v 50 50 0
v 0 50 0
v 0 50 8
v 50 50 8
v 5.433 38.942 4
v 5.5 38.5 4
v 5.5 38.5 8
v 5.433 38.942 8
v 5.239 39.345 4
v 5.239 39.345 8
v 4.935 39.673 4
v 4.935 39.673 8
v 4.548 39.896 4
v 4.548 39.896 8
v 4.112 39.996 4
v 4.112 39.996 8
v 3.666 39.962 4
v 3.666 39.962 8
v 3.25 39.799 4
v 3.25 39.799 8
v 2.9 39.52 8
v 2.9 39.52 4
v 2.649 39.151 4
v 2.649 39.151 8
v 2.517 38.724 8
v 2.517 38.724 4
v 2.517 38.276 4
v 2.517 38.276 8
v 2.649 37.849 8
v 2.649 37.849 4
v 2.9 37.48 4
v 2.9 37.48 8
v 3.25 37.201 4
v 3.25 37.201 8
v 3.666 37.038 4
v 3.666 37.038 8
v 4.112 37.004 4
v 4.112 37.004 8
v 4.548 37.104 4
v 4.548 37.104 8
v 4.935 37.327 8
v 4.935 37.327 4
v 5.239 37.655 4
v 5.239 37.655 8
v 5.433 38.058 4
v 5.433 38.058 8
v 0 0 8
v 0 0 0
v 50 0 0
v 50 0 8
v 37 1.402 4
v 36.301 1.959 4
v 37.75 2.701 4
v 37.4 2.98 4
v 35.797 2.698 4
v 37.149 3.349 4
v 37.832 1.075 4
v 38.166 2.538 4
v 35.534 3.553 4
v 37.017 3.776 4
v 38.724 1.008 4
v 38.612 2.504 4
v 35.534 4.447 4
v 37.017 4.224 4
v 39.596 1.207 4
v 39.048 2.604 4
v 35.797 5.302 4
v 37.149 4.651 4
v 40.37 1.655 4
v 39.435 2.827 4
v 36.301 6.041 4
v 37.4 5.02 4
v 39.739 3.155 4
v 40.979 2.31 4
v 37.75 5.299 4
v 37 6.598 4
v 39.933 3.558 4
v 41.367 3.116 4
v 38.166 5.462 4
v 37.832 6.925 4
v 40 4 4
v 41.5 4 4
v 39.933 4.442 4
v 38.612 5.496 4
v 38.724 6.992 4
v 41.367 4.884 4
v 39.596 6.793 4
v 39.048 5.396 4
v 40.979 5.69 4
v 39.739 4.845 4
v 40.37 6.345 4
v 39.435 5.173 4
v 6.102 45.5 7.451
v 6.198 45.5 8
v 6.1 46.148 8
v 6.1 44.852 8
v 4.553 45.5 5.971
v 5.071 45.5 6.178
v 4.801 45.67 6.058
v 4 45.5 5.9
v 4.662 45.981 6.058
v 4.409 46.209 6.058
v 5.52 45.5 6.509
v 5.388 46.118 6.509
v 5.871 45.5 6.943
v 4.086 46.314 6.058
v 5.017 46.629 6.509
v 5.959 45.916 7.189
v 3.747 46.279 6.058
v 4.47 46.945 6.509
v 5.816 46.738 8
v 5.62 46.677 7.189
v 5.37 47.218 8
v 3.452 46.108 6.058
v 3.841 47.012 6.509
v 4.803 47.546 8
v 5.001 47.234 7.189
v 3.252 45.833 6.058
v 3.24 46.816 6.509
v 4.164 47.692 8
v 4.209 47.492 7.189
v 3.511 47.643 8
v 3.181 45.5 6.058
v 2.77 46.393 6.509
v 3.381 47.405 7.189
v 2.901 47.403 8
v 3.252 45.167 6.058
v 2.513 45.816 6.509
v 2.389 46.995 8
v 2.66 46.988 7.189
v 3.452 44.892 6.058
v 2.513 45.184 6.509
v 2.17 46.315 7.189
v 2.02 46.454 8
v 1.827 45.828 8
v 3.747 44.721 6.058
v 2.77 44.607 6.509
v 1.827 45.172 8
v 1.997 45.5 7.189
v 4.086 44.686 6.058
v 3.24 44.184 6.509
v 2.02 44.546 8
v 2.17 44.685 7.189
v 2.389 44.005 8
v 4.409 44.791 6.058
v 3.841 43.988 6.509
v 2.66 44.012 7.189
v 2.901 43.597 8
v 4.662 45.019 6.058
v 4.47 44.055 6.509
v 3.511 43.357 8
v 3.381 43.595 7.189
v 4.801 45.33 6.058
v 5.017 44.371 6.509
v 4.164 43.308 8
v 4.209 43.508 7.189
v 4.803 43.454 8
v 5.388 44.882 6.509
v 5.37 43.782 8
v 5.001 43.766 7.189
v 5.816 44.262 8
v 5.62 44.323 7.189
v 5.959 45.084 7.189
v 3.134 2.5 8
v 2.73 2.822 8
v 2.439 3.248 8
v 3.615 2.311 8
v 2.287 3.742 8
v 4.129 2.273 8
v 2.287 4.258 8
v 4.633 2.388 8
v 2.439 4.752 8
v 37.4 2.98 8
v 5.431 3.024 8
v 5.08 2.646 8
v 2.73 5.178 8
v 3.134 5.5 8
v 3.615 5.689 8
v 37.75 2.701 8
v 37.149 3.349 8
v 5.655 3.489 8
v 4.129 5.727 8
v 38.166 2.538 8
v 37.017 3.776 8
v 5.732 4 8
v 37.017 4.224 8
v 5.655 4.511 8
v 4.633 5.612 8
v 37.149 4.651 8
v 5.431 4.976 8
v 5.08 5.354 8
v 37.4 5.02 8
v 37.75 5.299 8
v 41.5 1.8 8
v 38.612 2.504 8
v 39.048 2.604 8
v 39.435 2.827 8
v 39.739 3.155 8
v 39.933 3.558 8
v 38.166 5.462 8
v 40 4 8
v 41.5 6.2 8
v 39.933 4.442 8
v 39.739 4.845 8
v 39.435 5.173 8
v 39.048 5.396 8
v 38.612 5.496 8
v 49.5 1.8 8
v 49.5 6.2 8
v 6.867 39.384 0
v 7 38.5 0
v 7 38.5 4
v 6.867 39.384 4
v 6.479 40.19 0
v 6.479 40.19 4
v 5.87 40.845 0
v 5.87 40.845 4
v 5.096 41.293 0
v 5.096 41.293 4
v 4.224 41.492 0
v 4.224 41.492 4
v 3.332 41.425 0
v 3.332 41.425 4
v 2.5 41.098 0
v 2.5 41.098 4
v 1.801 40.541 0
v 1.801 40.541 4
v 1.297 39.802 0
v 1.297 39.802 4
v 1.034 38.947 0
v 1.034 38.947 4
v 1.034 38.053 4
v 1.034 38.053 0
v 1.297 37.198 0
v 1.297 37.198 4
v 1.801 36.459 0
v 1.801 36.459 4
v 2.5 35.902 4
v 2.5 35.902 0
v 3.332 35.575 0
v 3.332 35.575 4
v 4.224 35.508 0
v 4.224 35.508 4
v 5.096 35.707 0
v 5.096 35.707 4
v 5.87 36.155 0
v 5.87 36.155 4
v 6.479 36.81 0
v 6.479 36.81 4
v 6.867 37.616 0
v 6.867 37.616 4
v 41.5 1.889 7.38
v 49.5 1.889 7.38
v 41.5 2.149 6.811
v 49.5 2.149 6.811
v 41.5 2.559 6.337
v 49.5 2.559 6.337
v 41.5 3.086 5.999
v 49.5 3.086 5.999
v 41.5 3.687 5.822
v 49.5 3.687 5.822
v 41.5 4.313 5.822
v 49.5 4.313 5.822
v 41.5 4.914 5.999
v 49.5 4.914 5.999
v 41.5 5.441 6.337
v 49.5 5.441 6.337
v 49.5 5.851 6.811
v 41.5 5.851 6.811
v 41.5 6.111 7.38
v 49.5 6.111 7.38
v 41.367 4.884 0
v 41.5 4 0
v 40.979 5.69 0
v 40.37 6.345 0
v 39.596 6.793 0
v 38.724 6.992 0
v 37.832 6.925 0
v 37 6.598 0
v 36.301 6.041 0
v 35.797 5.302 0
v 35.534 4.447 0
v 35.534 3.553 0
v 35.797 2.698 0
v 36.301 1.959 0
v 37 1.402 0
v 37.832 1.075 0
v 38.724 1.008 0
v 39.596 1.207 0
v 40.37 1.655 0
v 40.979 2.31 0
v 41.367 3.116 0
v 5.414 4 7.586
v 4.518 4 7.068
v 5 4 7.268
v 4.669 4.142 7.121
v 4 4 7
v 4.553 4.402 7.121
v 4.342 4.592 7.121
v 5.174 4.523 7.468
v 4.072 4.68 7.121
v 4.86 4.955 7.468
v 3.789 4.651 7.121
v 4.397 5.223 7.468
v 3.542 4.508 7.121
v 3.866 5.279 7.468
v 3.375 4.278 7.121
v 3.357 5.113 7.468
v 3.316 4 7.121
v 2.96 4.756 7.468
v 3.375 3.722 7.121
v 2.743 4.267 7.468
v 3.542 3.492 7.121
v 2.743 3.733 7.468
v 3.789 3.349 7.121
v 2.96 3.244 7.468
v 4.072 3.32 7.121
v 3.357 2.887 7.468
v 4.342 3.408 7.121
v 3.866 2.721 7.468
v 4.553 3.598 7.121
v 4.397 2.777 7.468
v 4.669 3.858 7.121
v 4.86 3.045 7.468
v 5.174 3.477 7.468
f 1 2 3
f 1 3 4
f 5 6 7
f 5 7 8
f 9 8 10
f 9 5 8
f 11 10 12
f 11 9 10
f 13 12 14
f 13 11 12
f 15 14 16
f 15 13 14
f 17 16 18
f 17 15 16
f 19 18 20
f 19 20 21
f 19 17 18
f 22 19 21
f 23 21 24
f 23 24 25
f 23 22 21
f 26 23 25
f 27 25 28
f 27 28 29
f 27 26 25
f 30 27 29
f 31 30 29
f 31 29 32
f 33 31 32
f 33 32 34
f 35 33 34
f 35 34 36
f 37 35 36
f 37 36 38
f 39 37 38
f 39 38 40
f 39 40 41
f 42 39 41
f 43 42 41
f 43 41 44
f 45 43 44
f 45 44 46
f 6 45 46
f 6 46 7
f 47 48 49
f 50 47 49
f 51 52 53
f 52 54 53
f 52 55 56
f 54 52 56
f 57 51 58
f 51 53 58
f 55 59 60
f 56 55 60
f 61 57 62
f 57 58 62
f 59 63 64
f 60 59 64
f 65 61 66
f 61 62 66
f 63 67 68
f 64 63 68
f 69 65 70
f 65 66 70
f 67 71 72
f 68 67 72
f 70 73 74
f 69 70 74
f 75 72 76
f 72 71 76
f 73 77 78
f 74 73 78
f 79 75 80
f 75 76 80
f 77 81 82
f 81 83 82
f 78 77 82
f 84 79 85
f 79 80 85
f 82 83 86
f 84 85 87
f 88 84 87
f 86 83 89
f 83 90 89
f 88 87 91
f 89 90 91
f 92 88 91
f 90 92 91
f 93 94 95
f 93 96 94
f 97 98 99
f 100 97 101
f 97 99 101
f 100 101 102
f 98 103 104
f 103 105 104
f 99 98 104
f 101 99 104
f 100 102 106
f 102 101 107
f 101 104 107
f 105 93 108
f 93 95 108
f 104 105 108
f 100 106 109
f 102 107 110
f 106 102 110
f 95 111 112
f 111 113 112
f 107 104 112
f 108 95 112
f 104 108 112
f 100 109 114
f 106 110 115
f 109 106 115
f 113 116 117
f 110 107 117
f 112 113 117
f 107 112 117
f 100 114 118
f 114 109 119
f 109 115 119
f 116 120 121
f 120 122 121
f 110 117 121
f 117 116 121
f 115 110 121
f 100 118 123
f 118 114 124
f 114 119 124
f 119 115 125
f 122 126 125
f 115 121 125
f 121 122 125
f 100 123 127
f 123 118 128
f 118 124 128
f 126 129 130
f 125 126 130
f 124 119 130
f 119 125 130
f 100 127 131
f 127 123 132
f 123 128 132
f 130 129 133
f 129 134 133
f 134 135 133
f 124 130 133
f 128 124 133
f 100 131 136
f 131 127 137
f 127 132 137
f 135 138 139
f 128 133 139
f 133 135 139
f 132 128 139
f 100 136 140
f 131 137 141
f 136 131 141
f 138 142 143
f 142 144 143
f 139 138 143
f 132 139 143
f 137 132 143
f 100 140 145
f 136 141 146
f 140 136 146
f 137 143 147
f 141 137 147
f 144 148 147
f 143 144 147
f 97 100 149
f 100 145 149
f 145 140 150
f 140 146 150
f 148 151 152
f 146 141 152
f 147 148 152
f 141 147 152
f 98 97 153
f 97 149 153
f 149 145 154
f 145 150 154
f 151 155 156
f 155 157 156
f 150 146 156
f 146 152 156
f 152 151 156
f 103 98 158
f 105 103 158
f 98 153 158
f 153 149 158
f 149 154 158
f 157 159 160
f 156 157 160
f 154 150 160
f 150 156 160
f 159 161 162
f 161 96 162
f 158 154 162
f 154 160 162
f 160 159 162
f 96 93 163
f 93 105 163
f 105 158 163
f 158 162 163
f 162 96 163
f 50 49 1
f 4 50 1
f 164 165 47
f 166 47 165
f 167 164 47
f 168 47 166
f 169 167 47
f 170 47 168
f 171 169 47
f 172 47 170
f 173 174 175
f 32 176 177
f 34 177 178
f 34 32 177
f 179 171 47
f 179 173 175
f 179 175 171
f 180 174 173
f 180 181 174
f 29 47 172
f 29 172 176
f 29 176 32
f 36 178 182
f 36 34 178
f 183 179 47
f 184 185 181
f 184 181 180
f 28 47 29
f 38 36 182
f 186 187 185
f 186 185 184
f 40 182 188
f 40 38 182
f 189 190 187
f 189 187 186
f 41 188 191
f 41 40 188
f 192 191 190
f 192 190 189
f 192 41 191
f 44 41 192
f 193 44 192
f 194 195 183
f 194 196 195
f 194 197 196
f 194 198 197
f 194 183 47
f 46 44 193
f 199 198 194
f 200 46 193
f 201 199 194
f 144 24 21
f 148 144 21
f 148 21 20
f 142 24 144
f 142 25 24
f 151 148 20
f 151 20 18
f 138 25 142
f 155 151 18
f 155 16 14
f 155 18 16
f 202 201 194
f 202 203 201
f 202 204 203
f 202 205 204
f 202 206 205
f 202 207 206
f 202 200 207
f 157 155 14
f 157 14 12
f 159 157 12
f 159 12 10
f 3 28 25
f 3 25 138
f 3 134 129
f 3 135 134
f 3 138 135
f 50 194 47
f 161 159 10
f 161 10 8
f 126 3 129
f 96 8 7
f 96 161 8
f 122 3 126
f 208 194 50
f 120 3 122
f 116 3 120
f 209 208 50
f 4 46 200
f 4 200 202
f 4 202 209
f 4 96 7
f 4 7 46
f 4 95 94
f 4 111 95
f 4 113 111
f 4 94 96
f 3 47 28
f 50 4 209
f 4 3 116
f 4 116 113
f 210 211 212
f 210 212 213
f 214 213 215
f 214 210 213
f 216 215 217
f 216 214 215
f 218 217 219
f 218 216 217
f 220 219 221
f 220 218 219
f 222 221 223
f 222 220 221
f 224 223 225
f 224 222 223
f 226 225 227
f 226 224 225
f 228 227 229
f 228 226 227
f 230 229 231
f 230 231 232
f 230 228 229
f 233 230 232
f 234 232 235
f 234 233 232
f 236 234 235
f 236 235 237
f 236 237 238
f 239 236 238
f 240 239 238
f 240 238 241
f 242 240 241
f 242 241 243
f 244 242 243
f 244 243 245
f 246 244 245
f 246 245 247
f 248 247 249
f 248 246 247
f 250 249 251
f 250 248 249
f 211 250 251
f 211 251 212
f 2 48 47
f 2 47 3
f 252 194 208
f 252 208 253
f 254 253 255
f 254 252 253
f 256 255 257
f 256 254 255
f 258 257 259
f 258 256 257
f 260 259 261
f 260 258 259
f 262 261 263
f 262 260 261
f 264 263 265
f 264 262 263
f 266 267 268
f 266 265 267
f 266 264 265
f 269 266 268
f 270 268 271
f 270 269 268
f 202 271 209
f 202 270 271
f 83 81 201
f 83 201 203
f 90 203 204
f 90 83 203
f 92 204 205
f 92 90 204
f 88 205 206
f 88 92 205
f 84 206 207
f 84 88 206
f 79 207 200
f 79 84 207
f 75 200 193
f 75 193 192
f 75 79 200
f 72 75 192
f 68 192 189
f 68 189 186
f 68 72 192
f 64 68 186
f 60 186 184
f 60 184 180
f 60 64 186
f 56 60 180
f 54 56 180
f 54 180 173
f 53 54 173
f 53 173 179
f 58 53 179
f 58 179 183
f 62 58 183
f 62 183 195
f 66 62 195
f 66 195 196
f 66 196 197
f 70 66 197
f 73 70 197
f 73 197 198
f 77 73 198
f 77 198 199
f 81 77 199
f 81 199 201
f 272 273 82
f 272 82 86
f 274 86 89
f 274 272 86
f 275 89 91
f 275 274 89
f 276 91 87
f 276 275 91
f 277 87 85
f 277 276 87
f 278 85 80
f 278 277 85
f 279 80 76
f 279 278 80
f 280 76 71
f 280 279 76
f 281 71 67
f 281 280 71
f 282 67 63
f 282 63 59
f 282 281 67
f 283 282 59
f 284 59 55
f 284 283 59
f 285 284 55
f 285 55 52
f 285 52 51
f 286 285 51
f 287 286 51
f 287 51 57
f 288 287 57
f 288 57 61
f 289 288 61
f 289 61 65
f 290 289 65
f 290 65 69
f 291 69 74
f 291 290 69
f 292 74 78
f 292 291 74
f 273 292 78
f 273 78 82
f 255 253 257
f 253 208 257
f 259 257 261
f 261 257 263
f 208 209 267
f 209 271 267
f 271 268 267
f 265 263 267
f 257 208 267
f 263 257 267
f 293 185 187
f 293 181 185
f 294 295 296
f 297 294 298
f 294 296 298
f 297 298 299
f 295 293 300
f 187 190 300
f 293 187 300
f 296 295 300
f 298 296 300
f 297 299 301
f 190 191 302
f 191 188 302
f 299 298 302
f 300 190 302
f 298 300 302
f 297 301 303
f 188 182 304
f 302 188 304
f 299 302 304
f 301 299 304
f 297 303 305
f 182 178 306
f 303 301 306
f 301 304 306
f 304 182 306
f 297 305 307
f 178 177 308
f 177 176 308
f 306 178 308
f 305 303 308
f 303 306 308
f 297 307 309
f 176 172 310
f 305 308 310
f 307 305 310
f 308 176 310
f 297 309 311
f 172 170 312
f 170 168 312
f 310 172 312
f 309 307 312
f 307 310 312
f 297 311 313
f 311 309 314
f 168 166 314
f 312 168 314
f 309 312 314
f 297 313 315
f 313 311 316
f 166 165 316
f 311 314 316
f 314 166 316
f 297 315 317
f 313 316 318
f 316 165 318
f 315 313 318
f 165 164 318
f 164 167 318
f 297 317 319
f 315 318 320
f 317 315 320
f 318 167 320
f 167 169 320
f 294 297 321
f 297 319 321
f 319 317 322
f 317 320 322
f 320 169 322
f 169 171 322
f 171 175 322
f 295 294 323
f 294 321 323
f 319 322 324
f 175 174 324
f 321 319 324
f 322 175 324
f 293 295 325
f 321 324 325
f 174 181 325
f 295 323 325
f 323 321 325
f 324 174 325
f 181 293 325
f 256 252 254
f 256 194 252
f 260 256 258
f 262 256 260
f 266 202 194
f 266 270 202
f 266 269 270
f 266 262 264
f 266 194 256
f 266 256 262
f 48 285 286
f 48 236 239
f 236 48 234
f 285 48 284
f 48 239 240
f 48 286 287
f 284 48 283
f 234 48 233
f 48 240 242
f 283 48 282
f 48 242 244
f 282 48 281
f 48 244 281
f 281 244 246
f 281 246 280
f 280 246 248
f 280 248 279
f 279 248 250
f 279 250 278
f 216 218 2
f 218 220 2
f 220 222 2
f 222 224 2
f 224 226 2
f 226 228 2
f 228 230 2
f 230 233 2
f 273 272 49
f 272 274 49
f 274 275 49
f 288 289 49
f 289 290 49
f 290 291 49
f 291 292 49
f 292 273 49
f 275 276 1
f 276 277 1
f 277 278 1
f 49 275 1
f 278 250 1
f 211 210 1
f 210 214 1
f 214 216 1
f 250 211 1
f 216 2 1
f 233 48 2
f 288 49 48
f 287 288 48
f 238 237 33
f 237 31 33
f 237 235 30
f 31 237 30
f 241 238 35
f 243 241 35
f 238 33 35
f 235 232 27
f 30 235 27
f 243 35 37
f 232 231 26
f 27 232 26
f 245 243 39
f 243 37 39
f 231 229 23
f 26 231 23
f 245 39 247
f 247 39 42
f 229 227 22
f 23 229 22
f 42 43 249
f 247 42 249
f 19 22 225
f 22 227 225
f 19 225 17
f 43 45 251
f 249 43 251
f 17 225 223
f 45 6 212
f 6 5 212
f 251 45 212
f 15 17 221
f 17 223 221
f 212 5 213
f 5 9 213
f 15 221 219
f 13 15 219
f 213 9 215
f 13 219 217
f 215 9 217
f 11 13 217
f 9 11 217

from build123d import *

# Parameters (mm, degrees)
CYLINDER012_R     = 2.2
CYLINDER012_DEPTH = 8
CYLINDER011_R     = 3
CYLINDER011_DEPTH = 4
CYLINDER010_R     = 1.5
CYLINDER010_DEPTH = 8
CYLINDER009_R     = 3
CYLINDER009_DEPTH = 4
CYLINDER008_R     = 1.5
CYLINDER008_DEPTH = 8
BOX002_W          = 50
BOX002_H          = 50
BOX002_DEPTH      = 8


with BuildPart() as cylinder012:
    # Cylinder012 → Cylinder012 (new body)
    with BuildSketch(Plane(origin=(41.5, 4, 8), x_dir=(0, 0, -1), z_dir=(1, 0, 0))):
        Circle(CYLINDER012_R)
    extrude(amount=CYLINDER012_DEPTH)


with BuildPart() as sphere003:
    # Sphere003 → Sphere003 (revolve)
    with BuildSketch(Plane(origin=(4, 45.5, 8.1), x_dir=(1, 0, 0), z_dir=(0, -1, 0))):
        with BuildLine():
            ThreePointArc((0, -2.2), (2.2, 0), (0, 2.2))
            Line((0, 2.2), (0, -2.2))
        make_face()
    revolve(axis=Axis((4, 45.5, 8.1), (0, 0, 1)))


with BuildPart() as sphere001:
    # Sphere001 → Sphere001 (revolve)
    with BuildSketch(Plane(origin=(4, 4, 9), x_dir=(1, 0, 0), z_dir=(0, -1, 0))):
        with BuildLine():
            ThreePointArc((0, -2), (2, 0), (0, 2))
            Line((0, 2), (0, -2))
        make_face()
    revolve(axis=Axis((4, 4, 9), (0, 0, 1)))


with BuildPart() as cylinder011:
    # Cylinder011 → Cylinder011 (new body)
    with BuildSketch(Plane.XY):
        Circle(CYLINDER011_R)
    extrude(amount=CYLINDER011_DEPTH)


with BuildPart() as springhole004:
    # Cylinder010 → Cylinder010 (new body)
    with BuildSketch(Plane.XY):
        Circle(CYLINDER010_R)
    extrude(amount=CYLINDER010_DEPTH)

    # Fusion005: union Cylinder011
    add(cylinder011.part)


with BuildPart() as springhole004_1:
    # Fusion005 placement: moved
    add(springhole004.part.moved(Location((4, 38.5, 0))))


with BuildPart() as cylinder009:
    # Cylinder009 → Cylinder009 (new body)
    with BuildSketch(Plane.XY):
        Circle(CYLINDER009_R)
    extrude(amount=CYLINDER009_DEPTH)


with BuildPart() as springhole003:
    # Cylinder008 → Cylinder008 (new body)
    with BuildSketch(Plane.XY):
        Circle(CYLINDER008_R)
    extrude(amount=CYLINDER008_DEPTH)

    # Fusion004: union Cylinder009
    add(cylinder009.part)


with BuildPart() as springhole003_1:
    # Fusion004 placement: moved
    add(springhole003.part.moved(Location((38.5, 4, 0))))


with BuildPart() as cut012:
    # Box002 → Box002 (new body)
    with BuildSketch(Plane.XY):
        with Locations((25, 25)):
            Rectangle(BOX002_W, BOX002_H)
    extrude(amount=BOX002_DEPTH)

    # Cut008: cut SpringHole003
    add(springhole003_1.part, mode=Mode.SUBTRACT)

    # Cut009: cut SpringHole004
    add(springhole004_1.part, mode=Mode.SUBTRACT)

    # Cut010: cut Sphere001
    add(sphere001.part, mode=Mode.SUBTRACT)

    # Cut011: cut Sphere003
    add(sphere003.part, mode=Mode.SUBTRACT)

    # Cut012: cut Cylinder012
    add(cylinder012.part, mode=Mode.SUBTRACT)


solid = cut012.part
